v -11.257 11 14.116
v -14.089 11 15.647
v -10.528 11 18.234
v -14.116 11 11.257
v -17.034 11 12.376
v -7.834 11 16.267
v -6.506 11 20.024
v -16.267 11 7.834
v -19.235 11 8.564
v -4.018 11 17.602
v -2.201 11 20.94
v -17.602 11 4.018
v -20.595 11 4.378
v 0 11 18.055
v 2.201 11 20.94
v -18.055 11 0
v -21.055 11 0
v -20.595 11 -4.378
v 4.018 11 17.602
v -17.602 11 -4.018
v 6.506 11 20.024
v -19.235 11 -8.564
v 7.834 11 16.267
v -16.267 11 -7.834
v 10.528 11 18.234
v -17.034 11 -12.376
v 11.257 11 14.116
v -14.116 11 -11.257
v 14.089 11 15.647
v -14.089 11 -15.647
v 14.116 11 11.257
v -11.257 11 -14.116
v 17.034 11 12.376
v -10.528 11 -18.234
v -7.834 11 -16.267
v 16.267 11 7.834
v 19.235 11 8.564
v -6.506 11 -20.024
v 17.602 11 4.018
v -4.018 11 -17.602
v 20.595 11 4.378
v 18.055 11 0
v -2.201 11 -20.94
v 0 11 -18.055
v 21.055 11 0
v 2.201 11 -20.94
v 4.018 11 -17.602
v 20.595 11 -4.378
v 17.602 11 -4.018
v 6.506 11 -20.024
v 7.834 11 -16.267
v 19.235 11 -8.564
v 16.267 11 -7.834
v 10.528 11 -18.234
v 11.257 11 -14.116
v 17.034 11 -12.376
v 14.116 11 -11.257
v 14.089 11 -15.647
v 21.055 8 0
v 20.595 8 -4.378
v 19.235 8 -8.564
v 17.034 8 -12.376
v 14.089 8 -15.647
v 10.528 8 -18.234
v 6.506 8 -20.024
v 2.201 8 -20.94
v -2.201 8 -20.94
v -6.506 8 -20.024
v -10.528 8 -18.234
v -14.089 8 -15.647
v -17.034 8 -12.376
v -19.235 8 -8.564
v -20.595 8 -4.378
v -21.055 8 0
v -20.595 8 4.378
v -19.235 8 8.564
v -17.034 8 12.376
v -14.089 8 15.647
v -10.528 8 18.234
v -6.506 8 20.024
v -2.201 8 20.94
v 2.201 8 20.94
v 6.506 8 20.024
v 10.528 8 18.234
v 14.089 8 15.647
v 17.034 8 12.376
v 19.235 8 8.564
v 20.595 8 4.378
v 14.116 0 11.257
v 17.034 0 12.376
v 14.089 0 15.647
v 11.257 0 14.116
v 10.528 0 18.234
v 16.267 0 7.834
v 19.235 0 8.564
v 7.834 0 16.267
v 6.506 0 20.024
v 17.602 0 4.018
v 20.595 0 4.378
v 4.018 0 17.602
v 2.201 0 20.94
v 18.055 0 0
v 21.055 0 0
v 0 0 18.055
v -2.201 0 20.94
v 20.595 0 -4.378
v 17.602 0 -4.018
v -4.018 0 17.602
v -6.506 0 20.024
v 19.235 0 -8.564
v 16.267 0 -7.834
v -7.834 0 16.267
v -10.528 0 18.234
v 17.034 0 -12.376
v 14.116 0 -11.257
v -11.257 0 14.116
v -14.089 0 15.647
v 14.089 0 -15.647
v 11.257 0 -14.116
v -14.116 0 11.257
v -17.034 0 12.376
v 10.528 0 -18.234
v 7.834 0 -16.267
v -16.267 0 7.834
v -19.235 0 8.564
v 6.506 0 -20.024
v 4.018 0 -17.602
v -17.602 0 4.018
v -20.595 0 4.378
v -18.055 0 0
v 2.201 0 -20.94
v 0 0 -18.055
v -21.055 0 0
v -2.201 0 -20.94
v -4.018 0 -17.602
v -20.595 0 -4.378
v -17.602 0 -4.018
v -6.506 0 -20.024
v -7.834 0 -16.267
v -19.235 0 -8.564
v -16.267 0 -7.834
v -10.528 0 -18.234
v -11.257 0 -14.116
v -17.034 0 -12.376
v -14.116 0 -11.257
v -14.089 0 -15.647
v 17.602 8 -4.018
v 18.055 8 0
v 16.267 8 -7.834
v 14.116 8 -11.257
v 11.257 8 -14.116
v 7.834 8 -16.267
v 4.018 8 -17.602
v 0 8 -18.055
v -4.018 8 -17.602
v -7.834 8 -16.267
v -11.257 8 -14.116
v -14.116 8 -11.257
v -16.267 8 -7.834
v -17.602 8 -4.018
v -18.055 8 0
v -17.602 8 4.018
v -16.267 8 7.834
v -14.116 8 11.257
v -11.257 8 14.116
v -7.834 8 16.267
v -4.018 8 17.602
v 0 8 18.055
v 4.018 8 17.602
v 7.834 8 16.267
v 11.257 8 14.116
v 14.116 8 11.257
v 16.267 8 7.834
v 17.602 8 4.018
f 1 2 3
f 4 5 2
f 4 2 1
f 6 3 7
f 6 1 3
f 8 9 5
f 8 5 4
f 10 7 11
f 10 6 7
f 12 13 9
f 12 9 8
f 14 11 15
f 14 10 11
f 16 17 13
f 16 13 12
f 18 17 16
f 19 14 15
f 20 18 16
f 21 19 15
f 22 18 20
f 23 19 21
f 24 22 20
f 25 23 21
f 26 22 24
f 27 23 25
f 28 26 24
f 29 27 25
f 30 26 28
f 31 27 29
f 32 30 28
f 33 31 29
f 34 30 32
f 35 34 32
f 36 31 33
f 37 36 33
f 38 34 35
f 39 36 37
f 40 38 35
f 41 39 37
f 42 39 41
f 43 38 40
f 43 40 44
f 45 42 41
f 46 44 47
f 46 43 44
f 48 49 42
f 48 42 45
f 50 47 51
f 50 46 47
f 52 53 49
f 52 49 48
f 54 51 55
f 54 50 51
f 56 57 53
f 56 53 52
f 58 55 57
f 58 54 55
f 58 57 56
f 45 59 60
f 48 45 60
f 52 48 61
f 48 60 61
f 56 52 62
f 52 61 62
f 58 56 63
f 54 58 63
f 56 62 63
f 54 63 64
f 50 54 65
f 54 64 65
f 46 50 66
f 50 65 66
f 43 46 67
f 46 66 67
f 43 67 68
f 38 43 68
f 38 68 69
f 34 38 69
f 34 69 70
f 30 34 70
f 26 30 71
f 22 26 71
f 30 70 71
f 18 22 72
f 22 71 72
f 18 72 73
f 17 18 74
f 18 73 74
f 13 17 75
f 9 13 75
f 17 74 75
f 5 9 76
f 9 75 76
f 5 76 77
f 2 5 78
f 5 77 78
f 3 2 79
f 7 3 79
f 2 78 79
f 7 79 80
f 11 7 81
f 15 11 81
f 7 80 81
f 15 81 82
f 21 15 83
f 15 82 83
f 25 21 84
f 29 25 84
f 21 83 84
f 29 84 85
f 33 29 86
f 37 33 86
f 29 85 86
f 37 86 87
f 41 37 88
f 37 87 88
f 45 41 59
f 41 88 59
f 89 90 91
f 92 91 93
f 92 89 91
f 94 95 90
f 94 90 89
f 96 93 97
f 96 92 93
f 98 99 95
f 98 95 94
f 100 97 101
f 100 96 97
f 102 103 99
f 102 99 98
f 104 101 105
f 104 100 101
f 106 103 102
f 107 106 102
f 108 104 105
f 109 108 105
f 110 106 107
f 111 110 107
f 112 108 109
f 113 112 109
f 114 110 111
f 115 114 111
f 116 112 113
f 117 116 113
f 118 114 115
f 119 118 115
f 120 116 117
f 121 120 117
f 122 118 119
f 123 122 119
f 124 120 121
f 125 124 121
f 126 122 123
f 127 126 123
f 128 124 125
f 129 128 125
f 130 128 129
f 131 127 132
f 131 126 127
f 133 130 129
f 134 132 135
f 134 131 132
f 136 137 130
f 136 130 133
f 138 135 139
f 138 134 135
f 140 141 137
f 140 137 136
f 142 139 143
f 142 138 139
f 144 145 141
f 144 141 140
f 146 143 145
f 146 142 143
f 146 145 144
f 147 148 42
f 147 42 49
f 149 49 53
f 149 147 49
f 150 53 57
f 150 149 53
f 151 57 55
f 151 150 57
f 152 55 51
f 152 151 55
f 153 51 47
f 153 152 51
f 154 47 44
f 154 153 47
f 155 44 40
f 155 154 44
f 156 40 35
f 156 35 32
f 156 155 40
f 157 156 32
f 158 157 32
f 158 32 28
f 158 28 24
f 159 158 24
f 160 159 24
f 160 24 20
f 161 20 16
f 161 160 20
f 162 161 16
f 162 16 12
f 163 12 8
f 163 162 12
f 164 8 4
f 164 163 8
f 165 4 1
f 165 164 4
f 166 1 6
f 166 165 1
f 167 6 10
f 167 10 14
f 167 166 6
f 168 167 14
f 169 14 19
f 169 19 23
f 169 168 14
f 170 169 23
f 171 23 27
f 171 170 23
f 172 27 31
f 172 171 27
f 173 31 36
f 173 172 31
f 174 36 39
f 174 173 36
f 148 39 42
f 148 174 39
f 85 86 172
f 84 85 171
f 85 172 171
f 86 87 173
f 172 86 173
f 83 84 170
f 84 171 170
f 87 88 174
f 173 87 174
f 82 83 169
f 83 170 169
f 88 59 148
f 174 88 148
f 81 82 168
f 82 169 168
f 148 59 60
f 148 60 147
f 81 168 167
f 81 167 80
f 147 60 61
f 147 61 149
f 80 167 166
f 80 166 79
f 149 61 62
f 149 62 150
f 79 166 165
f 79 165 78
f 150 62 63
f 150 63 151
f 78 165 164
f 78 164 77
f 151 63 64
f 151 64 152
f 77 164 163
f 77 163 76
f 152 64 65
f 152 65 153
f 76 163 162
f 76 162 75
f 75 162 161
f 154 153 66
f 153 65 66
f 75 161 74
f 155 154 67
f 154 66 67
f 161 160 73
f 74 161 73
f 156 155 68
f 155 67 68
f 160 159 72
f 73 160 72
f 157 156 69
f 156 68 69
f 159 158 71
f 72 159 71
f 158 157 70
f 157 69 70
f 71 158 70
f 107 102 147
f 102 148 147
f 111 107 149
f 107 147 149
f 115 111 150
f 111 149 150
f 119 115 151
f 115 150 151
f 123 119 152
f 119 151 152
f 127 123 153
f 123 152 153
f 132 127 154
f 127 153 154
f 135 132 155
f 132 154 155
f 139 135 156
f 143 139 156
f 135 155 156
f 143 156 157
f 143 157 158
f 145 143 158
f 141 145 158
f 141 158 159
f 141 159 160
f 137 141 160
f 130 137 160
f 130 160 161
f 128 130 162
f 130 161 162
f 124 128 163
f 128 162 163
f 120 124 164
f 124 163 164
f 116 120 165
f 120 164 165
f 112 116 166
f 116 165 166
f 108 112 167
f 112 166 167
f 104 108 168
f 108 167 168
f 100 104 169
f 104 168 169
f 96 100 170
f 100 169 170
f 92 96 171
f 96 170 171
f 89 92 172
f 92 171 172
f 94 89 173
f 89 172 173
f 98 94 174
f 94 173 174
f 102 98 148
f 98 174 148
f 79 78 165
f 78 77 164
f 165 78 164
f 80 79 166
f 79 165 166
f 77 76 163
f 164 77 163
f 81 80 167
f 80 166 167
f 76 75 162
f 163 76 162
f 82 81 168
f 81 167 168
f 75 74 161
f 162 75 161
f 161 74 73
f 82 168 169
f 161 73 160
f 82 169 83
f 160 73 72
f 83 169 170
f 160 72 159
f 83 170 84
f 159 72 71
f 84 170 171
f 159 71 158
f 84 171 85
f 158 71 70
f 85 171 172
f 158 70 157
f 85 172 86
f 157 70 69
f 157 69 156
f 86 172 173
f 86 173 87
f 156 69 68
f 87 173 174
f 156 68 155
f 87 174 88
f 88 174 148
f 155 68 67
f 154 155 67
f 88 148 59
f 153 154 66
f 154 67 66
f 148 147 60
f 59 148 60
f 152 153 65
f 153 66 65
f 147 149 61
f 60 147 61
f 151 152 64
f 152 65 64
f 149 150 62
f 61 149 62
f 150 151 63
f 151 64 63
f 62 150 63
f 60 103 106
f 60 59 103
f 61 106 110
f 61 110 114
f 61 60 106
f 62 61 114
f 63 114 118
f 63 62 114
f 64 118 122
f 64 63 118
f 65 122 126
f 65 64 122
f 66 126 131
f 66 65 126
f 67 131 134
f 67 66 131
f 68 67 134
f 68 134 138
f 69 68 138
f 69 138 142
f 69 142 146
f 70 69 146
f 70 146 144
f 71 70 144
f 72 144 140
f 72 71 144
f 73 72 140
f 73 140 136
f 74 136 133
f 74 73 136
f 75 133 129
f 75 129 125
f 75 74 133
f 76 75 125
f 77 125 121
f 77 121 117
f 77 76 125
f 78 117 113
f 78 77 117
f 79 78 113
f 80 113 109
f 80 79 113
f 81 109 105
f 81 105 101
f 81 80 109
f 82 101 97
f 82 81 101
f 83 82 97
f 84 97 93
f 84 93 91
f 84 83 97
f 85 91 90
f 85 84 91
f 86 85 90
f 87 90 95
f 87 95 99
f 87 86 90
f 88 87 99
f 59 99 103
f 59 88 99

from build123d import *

# Parameters (mm, degrees)
SKETCH1_W           = 3
SKETCH1_H           = 8
SKETCH2_R           = 21.055
SKETCH2_R_2         = 18.055
BOSS_EXTRUDE1_DEPTH = 3


with BuildPart() as part:
    # Sketch1 → Revolve1 (revolve)
    with BuildSketch(Plane.XY):
        with Locations((19.555, 4)):
            Rectangle(SKETCH1_W, SKETCH1_H)
    revolve(axis=Axis((0, 0, 0), (0, 1, 0)))


with BuildPart() as body_2:
    # Sketch2 → Boss-Extrude1 (new body)
    with BuildSketch(Plane(origin=(0, 8, 0), x_dir=(1, 0, 0), z_dir=(0, 1, 0))):
        Circle(SKETCH2_R)
        Circle(SKETCH2_R_2, mode=Mode.SUBTRACT)
    extrude(amount=BOSS_EXTRUDE1_DEPTH)


solid = Compound([part.part, body_2.part])
